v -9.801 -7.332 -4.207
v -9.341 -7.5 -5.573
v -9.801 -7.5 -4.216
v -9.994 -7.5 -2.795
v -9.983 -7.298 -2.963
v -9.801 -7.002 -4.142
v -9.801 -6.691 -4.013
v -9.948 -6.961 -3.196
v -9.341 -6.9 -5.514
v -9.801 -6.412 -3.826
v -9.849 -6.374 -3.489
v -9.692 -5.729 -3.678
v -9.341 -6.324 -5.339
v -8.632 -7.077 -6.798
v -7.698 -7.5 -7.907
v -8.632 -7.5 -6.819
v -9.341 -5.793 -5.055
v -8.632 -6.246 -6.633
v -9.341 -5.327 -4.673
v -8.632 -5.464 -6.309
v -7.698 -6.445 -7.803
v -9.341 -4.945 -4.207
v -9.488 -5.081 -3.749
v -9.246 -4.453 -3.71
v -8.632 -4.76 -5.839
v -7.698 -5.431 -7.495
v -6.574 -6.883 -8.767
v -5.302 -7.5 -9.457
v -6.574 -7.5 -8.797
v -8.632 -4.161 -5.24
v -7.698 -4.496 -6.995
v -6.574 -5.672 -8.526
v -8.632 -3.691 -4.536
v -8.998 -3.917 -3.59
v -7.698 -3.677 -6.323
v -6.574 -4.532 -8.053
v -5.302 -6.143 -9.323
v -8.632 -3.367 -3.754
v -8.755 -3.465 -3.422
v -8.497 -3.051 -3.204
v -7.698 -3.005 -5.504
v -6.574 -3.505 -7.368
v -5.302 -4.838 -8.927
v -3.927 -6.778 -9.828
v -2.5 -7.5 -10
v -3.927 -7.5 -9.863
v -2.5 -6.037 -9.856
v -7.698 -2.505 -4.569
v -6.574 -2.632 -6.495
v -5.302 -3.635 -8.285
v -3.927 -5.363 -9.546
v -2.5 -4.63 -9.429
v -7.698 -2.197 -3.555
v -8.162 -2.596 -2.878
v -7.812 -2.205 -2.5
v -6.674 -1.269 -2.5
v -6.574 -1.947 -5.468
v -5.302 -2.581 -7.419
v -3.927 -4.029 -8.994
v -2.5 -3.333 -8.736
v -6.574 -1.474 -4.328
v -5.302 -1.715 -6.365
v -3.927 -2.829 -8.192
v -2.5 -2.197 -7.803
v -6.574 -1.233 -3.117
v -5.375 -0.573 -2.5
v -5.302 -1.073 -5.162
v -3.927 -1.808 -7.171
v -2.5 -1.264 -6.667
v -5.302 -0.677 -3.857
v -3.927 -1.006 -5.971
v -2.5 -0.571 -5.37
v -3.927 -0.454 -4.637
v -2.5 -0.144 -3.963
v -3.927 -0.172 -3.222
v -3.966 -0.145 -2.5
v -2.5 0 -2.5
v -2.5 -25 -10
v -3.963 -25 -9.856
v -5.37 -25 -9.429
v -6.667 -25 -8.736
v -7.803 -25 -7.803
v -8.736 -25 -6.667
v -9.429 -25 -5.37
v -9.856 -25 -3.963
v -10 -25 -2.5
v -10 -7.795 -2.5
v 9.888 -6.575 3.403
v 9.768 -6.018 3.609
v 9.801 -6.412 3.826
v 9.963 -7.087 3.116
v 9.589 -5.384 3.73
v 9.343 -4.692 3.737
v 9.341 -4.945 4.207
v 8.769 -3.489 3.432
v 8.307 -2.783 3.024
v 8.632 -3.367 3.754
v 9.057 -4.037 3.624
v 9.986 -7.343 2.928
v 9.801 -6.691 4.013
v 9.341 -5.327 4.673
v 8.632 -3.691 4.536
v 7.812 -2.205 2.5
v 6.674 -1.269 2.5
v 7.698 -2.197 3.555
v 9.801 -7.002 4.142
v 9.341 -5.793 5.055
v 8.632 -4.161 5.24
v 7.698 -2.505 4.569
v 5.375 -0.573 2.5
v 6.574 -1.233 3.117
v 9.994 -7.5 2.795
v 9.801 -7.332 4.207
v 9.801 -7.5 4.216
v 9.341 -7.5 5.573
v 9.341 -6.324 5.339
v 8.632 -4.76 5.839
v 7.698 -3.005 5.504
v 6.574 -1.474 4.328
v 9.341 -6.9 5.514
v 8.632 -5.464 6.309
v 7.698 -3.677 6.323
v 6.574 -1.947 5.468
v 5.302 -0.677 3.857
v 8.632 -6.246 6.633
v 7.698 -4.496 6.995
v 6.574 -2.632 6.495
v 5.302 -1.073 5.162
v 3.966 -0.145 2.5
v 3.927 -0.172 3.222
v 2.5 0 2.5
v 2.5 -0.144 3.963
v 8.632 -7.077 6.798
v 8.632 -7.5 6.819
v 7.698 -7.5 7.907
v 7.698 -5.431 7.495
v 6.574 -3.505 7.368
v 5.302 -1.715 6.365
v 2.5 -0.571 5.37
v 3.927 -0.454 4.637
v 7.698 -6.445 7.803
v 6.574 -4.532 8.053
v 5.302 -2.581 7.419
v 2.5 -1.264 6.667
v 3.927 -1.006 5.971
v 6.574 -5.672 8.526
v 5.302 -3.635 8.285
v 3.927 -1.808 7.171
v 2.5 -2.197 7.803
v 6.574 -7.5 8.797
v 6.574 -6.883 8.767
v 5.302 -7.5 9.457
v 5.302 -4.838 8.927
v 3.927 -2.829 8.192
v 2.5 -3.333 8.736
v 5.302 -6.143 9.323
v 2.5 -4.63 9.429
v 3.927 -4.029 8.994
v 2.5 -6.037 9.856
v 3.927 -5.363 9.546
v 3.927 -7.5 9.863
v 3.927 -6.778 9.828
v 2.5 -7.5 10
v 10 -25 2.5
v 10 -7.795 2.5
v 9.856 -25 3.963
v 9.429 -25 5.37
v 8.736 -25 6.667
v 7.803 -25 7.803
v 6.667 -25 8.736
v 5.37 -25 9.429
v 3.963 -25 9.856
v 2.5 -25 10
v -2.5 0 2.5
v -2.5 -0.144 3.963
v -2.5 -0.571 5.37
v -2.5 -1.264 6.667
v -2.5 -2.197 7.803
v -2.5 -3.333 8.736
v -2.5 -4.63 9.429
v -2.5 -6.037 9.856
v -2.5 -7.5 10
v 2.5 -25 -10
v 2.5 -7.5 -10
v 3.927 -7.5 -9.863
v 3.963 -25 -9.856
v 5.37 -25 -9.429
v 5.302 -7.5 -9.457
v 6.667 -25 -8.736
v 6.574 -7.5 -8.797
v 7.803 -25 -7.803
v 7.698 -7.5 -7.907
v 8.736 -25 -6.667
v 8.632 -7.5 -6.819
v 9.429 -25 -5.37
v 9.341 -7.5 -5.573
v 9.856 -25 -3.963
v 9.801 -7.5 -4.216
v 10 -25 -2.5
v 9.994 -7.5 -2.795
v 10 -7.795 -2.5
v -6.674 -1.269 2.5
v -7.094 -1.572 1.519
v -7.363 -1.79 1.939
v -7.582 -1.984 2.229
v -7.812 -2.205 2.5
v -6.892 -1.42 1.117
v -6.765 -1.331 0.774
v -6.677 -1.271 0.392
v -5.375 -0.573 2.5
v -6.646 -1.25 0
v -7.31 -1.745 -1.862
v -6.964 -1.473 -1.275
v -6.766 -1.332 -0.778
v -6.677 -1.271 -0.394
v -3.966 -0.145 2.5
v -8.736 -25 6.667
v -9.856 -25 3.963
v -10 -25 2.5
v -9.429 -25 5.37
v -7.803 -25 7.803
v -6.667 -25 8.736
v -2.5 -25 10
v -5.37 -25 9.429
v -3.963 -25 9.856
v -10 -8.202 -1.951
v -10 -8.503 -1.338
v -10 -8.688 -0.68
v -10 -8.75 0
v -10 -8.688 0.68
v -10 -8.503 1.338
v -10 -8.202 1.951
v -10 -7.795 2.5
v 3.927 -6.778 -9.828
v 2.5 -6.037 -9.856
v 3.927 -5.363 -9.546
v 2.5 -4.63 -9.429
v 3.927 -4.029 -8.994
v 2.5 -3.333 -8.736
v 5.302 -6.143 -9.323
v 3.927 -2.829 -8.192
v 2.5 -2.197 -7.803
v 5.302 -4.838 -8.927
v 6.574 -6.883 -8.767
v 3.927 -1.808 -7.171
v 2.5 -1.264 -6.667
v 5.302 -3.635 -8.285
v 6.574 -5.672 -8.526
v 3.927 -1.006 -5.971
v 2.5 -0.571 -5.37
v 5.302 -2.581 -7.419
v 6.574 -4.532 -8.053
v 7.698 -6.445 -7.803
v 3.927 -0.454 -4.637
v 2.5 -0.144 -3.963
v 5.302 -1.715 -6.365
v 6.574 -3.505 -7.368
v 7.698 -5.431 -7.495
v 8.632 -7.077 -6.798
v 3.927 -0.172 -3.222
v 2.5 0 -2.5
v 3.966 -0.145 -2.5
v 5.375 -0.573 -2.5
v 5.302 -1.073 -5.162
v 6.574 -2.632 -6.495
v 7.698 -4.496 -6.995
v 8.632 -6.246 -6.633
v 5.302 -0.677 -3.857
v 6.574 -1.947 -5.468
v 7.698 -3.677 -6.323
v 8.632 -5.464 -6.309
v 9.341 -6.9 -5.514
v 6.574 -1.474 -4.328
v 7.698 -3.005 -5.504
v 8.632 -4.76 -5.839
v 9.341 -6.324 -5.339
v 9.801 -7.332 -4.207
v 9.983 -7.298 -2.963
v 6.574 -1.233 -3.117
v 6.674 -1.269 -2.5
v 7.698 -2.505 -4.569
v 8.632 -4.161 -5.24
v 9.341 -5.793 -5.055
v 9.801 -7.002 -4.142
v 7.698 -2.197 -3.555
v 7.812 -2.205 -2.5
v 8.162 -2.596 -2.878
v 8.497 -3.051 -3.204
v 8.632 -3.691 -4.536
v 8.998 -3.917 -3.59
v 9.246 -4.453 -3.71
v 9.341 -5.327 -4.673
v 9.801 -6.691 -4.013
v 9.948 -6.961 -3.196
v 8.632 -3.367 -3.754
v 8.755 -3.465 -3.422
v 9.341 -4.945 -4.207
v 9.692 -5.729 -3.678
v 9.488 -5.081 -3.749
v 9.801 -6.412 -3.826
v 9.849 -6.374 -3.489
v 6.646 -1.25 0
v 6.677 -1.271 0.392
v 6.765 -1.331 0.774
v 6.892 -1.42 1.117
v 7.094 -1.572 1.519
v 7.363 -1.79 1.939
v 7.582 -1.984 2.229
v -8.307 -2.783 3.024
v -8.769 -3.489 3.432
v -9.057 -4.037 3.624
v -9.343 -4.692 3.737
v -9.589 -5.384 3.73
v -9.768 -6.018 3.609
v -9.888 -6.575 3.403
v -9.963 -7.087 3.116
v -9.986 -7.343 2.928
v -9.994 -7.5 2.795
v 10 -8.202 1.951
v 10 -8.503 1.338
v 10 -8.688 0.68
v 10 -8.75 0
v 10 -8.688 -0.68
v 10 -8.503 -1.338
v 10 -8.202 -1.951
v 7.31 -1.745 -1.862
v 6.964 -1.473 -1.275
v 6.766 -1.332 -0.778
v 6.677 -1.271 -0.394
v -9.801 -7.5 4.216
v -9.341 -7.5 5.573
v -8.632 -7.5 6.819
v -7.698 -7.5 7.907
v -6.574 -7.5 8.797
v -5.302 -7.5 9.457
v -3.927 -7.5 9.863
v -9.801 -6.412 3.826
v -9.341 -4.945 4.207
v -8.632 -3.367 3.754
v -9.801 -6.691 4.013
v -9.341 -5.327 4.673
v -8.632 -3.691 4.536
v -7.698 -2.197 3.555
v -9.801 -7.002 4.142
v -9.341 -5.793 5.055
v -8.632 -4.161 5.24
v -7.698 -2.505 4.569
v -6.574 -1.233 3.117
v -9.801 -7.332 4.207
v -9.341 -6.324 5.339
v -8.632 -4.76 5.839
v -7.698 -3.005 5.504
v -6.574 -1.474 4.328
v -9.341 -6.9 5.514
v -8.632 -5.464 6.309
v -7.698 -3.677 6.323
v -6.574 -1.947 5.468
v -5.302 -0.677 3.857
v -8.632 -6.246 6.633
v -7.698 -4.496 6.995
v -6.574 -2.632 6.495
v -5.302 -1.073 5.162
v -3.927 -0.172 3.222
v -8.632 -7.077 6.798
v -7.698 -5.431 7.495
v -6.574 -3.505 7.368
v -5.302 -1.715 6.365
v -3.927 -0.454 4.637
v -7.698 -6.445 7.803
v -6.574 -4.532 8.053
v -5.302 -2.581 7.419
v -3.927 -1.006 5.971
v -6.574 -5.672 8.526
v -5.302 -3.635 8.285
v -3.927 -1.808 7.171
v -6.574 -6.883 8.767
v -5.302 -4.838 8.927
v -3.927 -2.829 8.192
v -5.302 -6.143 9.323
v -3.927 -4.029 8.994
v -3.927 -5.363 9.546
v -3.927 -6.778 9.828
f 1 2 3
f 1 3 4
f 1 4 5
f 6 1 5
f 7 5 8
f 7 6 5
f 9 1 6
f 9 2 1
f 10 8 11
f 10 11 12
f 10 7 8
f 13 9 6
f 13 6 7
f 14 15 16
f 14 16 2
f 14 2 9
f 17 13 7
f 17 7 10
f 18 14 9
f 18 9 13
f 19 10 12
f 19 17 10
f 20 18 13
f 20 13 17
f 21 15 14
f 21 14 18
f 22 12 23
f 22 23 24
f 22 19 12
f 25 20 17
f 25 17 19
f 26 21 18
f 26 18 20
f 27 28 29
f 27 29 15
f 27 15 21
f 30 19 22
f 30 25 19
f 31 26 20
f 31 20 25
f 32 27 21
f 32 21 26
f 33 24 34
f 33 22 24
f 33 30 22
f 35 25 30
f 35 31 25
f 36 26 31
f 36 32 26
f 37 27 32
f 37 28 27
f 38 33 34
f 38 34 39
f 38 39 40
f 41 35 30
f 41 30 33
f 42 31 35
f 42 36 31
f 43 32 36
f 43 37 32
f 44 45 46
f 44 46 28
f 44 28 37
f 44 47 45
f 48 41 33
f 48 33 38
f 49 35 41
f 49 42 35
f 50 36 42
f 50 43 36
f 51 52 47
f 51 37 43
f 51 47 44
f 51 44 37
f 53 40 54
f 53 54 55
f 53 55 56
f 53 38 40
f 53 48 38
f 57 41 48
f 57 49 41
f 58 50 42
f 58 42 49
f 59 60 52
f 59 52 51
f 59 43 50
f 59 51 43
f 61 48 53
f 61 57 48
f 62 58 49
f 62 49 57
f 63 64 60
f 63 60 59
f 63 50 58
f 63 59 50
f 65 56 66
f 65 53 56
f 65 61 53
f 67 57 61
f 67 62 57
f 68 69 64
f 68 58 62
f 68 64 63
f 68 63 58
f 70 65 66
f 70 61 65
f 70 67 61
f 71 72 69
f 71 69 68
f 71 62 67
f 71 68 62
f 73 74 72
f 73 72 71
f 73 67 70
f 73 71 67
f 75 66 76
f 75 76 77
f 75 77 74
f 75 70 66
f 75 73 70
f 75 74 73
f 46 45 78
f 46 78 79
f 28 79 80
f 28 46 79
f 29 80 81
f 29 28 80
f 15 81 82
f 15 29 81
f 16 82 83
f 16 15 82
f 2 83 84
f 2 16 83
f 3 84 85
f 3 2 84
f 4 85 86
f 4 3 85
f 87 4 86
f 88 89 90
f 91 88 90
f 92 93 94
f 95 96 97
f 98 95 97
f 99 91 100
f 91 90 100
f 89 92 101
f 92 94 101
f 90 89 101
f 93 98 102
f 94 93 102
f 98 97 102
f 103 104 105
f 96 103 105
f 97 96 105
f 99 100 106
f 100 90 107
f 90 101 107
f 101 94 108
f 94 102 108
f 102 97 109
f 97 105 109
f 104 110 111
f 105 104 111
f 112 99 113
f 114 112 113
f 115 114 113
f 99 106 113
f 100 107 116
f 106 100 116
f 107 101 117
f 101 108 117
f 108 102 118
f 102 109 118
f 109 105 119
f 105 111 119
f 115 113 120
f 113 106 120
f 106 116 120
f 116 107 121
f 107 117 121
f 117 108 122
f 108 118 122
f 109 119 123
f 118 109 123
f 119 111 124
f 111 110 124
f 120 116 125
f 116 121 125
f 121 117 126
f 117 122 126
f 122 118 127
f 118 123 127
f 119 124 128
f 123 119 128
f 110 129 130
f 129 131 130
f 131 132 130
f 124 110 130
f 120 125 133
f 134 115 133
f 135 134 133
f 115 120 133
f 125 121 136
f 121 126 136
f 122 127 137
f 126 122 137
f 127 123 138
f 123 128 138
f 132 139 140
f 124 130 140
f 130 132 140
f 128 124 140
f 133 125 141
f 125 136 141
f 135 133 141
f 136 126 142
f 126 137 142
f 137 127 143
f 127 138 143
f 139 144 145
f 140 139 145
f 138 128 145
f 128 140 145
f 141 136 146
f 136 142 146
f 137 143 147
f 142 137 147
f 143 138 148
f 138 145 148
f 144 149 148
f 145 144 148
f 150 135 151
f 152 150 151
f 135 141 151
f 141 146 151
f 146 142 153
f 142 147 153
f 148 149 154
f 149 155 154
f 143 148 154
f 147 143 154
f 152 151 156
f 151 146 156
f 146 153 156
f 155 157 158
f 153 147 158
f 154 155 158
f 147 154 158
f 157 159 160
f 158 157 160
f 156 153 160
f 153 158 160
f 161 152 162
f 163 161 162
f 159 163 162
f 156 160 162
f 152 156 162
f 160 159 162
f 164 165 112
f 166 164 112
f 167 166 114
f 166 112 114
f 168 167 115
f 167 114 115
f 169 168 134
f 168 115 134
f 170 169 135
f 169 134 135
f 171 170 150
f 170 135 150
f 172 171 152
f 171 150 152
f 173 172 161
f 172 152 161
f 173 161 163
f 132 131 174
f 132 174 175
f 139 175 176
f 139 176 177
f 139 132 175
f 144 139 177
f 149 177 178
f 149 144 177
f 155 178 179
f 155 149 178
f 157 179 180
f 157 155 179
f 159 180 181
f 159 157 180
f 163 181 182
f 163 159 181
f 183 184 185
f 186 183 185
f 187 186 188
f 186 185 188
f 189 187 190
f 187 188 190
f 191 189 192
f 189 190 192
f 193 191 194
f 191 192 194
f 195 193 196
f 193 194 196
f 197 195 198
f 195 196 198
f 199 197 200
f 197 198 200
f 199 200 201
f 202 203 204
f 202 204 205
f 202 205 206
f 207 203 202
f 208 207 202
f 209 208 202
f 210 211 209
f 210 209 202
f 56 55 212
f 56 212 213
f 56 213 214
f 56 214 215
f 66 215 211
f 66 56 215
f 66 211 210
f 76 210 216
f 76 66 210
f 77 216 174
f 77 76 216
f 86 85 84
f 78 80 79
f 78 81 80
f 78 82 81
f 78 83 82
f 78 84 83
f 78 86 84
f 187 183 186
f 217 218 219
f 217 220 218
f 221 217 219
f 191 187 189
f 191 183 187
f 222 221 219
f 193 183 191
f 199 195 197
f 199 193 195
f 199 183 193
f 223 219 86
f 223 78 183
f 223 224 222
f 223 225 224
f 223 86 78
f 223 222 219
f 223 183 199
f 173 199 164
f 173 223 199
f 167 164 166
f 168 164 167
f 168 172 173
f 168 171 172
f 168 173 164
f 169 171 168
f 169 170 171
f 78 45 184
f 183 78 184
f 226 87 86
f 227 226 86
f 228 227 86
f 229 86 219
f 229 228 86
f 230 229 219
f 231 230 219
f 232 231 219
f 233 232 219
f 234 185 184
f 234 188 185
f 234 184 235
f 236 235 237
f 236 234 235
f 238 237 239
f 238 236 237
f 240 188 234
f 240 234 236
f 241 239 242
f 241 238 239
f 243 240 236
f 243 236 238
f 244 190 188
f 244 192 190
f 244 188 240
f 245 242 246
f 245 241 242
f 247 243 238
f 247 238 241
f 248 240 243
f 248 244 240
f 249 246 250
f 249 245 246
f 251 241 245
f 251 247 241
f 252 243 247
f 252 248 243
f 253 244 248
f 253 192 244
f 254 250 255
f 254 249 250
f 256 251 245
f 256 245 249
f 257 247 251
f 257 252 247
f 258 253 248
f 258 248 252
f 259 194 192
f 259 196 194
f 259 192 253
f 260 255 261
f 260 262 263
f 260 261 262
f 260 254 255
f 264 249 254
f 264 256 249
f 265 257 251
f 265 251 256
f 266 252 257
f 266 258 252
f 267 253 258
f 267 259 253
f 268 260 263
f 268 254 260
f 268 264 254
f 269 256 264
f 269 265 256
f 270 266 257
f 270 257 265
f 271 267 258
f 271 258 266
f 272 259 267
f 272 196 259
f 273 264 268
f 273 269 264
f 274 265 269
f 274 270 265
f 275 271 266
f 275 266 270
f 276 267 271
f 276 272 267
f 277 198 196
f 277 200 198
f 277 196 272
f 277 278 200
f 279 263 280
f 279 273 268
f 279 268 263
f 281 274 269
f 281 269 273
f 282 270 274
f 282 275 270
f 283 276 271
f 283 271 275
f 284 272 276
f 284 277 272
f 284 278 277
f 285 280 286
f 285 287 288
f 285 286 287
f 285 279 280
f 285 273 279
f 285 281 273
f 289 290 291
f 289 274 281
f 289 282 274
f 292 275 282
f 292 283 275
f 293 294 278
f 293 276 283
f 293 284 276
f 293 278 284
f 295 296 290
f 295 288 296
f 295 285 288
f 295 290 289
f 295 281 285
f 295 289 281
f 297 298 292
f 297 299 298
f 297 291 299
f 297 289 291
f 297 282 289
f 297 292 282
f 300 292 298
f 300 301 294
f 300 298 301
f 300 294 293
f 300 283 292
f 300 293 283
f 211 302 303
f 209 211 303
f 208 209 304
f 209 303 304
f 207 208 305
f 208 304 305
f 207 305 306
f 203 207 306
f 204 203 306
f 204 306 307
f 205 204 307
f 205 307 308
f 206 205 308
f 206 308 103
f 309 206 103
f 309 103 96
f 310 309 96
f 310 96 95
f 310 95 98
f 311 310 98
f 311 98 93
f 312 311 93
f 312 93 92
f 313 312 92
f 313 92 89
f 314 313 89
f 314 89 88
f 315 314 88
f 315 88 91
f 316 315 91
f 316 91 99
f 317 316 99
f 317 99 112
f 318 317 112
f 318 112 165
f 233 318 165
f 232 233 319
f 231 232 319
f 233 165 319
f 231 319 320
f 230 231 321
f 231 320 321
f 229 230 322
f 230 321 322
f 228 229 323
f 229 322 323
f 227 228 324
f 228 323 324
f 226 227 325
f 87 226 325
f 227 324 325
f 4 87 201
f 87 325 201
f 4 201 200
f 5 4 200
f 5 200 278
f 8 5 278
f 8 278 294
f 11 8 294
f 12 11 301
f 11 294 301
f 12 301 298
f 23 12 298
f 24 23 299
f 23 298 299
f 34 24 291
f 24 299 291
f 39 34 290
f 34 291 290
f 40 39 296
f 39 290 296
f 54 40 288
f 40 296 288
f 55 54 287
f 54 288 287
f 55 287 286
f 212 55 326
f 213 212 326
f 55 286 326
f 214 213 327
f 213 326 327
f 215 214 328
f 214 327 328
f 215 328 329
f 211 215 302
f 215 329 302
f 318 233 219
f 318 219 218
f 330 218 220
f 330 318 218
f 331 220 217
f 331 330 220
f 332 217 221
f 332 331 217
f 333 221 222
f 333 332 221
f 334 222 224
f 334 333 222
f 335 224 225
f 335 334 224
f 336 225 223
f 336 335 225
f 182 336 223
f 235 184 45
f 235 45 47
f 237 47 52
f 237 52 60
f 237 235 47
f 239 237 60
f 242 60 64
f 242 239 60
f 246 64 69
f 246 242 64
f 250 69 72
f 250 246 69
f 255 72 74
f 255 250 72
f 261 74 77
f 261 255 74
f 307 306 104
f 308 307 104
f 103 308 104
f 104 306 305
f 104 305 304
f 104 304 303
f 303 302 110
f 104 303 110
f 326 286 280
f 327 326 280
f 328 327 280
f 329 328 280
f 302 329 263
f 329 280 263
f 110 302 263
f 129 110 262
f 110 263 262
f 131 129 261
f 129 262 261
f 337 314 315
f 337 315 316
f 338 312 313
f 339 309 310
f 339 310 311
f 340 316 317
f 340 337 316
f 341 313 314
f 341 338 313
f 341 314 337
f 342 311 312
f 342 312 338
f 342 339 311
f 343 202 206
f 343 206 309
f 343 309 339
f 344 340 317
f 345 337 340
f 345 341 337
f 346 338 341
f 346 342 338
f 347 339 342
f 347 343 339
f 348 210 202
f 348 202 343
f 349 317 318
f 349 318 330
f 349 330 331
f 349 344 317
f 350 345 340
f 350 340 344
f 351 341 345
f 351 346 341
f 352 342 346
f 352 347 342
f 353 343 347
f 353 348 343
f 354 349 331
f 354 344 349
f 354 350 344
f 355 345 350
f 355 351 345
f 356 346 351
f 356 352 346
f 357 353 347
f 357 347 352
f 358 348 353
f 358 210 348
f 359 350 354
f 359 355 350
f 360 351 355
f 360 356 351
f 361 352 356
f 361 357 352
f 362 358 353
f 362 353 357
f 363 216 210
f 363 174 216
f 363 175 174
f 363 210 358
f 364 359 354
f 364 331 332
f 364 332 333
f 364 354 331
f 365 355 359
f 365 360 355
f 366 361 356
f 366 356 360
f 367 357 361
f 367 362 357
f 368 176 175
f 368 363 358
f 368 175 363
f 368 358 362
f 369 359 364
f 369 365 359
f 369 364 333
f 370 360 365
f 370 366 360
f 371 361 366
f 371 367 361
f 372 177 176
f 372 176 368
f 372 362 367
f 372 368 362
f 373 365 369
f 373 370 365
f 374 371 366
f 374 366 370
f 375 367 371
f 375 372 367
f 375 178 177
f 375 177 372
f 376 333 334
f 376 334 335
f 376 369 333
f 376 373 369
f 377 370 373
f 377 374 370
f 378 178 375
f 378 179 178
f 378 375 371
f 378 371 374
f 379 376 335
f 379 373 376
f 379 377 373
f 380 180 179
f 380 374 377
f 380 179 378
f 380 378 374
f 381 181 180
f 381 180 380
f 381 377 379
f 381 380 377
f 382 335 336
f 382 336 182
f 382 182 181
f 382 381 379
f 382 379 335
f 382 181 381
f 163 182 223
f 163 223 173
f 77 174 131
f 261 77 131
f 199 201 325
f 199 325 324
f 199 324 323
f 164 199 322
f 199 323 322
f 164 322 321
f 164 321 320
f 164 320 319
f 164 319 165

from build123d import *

# Parameters (mm, degrees)
F0_W         = 20
F0_H         = 20
F1_DEPTH     = 25
F2_R         = 3.75
F3_DEPTH     = 25
F4_R         = 7.5
F5_T1_DEPTH  = 36.25
F5_T3_DEPTH  = 5
F5_T6_ANGLE  = 90
F5_T8_ANGLE  = 90
F5_T10_ANGLE = 90
F5_T12_ANGLE = 90


# Not quite as in the source:
# - a fillet or chamfer that OpenCascade refuses, or shapes differently, is made with other operations: its cross-section is extruded or revolved along the edge and cut away or added


with BuildPart() as f1:
    # F0 (on Front) → F1 (new body)
    with BuildSketch(Plane.XZ):
        Rectangle(F0_W, F0_H)
    extrude(amount=F1_DEPTH)

    # F2 (on Right) → F3 (cut, symmetric)
    with BuildSketch(Plane.YZ):
        with Locations((-5, 0)):
            Circle(F2_R)
    extrude(amount=F3_DEPTH, both=True, mode=Mode.SUBTRACT)

    # F4
    f4_edges = [f1.edges().sort_by_distance(p)[0] for p in [
        (0, 0, 10),
        (0, 0, -10),
    ]]
    fillet(f4_edges, radius=F4_R)

    # F5: fillet of radius 7.5 on 8 edges, made by hand

    # F5_s2 → F5_t1 (cut)
    with BuildSketch(Plane.XZ.offset(7.5)):
        with BuildLine():
            ThreePointArc((-10, 2.5), (-7.8033008589, 7.8033008589), (-2.5, 10))
            Line((-2.5, 10), (-10, 10))
            Line((-10, 10), (-10, 2.5))
        make_face()
        with BuildLine():
            ThreePointArc((10, 2.5), (7.8033008589, 7.8033008589), (2.5, 10))
            Line((2.5, 10), (10, 10))
            Line((10, 10), (10, 2.5))
        make_face()
        with BuildLine():
            ThreePointArc((-2.5, -10), (-7.8033008589, -7.8033008589), (-10, -2.5))
            Line((-10, -2.5), (-10, -10))
            Line((-10, -10), (-2.5, -10))
        make_face()
        with BuildLine():
            ThreePointArc((2.5, -10), (7.8033008589, -7.8033008589), (10, -2.5))
            Line((10, -2.5), (10, -10))
            Line((10, -10), (2.5, -10))
        make_face()
    extrude(amount=F5_T1_DEPTH, mode=Mode.SUBTRACT)

    # F5_s4 → F5_t3 (cut)
    with BuildSketch(Plane.XY.offset(-2.5)):
        with BuildLine():
            ThreePointArc((10, -7.5), (7.8033008589, -2.1966991411), (2.5, 0))
            Line((2.5, 0), (10, 0))
            Line((10, 0), (10, -7.5))
        make_face()
        with BuildLine():
            ThreePointArc((-10, -7.5), (-7.8033008589, -2.1966991411), (-2.5, 0))
            Line((-2.5, 0), (-10, 0))
            Line((-10, 0), (-10, -7.5))
        make_face()
    extrude(amount=F5_T3_DEPTH, mode=Mode.SUBTRACT)

    # F5_s5 → F5_t6 (revolve, cut)
    with BuildSketch(Plane.XY.offset(2.5)):
        with BuildLine():
            ThreePointArc((-10, -7.5), (-7.8033008589, -2.1966991411), (-2.5, 0))
            Line((-2.5, 0), (-10, 0))
            Line((-10, 0), (-10, -7.5))
        make_face()
    revolve(axis=Axis((-10, -7.5, 2.5), (1, 0, 0)), revolution_arc=F5_T6_ANGLE, mode=Mode.SUBTRACT)

    # F5_s7 → F5_t8 (revolve, cut)
    with BuildSketch(Plane.XZ.offset(7.5)):
        with BuildLine():
            ThreePointArc((-10, -2.5), (-7.8033008589, -7.8033008589), (-2.5, -10))
            Line((-2.5, -10), (-10, -10))
            Line((-10, -10), (-10, -2.5))
        make_face()
    revolve(axis=Axis((-10, -7.5, -2.5), (1, 0, 0)), revolution_arc=F5_T8_ANGLE, mode=Mode.SUBTRACT)

    # F5_s9 → F5_t10 (revolve, cut)
    with BuildSketch(Plane.XZ.offset(7.5)):
        with BuildLine():
            ThreePointArc((2.5, -10), (7.8033008589, -7.8033008589), (10, -2.5))
            Line((10, -2.5), (10, -10))
            Line((10, -10), (2.5, -10))
        make_face()
    revolve(axis=Axis((10, -7.5, -2.5), (1, 0, 0)), revolution_arc=F5_T10_ANGLE, mode=Mode.SUBTRACT)

    # F5_s11 → F5_t12 (revolve, cut)
    with BuildSketch(Plane.XY.offset(2.5)):
        with BuildLine():
            ThreePointArc((10, -7.5), (7.8033008589, -2.1966991411), (2.5, 0))
            Line((2.5, 0), (10, 0))
            Line((10, 0), (10, -7.5))
        make_face()
    revolve(axis=Axis((10, -7.5, 2.5), (1, 0, 0)), revolution_arc=F5_T12_ANGLE, mode=Mode.SUBTRACT)


solid = f1.part
